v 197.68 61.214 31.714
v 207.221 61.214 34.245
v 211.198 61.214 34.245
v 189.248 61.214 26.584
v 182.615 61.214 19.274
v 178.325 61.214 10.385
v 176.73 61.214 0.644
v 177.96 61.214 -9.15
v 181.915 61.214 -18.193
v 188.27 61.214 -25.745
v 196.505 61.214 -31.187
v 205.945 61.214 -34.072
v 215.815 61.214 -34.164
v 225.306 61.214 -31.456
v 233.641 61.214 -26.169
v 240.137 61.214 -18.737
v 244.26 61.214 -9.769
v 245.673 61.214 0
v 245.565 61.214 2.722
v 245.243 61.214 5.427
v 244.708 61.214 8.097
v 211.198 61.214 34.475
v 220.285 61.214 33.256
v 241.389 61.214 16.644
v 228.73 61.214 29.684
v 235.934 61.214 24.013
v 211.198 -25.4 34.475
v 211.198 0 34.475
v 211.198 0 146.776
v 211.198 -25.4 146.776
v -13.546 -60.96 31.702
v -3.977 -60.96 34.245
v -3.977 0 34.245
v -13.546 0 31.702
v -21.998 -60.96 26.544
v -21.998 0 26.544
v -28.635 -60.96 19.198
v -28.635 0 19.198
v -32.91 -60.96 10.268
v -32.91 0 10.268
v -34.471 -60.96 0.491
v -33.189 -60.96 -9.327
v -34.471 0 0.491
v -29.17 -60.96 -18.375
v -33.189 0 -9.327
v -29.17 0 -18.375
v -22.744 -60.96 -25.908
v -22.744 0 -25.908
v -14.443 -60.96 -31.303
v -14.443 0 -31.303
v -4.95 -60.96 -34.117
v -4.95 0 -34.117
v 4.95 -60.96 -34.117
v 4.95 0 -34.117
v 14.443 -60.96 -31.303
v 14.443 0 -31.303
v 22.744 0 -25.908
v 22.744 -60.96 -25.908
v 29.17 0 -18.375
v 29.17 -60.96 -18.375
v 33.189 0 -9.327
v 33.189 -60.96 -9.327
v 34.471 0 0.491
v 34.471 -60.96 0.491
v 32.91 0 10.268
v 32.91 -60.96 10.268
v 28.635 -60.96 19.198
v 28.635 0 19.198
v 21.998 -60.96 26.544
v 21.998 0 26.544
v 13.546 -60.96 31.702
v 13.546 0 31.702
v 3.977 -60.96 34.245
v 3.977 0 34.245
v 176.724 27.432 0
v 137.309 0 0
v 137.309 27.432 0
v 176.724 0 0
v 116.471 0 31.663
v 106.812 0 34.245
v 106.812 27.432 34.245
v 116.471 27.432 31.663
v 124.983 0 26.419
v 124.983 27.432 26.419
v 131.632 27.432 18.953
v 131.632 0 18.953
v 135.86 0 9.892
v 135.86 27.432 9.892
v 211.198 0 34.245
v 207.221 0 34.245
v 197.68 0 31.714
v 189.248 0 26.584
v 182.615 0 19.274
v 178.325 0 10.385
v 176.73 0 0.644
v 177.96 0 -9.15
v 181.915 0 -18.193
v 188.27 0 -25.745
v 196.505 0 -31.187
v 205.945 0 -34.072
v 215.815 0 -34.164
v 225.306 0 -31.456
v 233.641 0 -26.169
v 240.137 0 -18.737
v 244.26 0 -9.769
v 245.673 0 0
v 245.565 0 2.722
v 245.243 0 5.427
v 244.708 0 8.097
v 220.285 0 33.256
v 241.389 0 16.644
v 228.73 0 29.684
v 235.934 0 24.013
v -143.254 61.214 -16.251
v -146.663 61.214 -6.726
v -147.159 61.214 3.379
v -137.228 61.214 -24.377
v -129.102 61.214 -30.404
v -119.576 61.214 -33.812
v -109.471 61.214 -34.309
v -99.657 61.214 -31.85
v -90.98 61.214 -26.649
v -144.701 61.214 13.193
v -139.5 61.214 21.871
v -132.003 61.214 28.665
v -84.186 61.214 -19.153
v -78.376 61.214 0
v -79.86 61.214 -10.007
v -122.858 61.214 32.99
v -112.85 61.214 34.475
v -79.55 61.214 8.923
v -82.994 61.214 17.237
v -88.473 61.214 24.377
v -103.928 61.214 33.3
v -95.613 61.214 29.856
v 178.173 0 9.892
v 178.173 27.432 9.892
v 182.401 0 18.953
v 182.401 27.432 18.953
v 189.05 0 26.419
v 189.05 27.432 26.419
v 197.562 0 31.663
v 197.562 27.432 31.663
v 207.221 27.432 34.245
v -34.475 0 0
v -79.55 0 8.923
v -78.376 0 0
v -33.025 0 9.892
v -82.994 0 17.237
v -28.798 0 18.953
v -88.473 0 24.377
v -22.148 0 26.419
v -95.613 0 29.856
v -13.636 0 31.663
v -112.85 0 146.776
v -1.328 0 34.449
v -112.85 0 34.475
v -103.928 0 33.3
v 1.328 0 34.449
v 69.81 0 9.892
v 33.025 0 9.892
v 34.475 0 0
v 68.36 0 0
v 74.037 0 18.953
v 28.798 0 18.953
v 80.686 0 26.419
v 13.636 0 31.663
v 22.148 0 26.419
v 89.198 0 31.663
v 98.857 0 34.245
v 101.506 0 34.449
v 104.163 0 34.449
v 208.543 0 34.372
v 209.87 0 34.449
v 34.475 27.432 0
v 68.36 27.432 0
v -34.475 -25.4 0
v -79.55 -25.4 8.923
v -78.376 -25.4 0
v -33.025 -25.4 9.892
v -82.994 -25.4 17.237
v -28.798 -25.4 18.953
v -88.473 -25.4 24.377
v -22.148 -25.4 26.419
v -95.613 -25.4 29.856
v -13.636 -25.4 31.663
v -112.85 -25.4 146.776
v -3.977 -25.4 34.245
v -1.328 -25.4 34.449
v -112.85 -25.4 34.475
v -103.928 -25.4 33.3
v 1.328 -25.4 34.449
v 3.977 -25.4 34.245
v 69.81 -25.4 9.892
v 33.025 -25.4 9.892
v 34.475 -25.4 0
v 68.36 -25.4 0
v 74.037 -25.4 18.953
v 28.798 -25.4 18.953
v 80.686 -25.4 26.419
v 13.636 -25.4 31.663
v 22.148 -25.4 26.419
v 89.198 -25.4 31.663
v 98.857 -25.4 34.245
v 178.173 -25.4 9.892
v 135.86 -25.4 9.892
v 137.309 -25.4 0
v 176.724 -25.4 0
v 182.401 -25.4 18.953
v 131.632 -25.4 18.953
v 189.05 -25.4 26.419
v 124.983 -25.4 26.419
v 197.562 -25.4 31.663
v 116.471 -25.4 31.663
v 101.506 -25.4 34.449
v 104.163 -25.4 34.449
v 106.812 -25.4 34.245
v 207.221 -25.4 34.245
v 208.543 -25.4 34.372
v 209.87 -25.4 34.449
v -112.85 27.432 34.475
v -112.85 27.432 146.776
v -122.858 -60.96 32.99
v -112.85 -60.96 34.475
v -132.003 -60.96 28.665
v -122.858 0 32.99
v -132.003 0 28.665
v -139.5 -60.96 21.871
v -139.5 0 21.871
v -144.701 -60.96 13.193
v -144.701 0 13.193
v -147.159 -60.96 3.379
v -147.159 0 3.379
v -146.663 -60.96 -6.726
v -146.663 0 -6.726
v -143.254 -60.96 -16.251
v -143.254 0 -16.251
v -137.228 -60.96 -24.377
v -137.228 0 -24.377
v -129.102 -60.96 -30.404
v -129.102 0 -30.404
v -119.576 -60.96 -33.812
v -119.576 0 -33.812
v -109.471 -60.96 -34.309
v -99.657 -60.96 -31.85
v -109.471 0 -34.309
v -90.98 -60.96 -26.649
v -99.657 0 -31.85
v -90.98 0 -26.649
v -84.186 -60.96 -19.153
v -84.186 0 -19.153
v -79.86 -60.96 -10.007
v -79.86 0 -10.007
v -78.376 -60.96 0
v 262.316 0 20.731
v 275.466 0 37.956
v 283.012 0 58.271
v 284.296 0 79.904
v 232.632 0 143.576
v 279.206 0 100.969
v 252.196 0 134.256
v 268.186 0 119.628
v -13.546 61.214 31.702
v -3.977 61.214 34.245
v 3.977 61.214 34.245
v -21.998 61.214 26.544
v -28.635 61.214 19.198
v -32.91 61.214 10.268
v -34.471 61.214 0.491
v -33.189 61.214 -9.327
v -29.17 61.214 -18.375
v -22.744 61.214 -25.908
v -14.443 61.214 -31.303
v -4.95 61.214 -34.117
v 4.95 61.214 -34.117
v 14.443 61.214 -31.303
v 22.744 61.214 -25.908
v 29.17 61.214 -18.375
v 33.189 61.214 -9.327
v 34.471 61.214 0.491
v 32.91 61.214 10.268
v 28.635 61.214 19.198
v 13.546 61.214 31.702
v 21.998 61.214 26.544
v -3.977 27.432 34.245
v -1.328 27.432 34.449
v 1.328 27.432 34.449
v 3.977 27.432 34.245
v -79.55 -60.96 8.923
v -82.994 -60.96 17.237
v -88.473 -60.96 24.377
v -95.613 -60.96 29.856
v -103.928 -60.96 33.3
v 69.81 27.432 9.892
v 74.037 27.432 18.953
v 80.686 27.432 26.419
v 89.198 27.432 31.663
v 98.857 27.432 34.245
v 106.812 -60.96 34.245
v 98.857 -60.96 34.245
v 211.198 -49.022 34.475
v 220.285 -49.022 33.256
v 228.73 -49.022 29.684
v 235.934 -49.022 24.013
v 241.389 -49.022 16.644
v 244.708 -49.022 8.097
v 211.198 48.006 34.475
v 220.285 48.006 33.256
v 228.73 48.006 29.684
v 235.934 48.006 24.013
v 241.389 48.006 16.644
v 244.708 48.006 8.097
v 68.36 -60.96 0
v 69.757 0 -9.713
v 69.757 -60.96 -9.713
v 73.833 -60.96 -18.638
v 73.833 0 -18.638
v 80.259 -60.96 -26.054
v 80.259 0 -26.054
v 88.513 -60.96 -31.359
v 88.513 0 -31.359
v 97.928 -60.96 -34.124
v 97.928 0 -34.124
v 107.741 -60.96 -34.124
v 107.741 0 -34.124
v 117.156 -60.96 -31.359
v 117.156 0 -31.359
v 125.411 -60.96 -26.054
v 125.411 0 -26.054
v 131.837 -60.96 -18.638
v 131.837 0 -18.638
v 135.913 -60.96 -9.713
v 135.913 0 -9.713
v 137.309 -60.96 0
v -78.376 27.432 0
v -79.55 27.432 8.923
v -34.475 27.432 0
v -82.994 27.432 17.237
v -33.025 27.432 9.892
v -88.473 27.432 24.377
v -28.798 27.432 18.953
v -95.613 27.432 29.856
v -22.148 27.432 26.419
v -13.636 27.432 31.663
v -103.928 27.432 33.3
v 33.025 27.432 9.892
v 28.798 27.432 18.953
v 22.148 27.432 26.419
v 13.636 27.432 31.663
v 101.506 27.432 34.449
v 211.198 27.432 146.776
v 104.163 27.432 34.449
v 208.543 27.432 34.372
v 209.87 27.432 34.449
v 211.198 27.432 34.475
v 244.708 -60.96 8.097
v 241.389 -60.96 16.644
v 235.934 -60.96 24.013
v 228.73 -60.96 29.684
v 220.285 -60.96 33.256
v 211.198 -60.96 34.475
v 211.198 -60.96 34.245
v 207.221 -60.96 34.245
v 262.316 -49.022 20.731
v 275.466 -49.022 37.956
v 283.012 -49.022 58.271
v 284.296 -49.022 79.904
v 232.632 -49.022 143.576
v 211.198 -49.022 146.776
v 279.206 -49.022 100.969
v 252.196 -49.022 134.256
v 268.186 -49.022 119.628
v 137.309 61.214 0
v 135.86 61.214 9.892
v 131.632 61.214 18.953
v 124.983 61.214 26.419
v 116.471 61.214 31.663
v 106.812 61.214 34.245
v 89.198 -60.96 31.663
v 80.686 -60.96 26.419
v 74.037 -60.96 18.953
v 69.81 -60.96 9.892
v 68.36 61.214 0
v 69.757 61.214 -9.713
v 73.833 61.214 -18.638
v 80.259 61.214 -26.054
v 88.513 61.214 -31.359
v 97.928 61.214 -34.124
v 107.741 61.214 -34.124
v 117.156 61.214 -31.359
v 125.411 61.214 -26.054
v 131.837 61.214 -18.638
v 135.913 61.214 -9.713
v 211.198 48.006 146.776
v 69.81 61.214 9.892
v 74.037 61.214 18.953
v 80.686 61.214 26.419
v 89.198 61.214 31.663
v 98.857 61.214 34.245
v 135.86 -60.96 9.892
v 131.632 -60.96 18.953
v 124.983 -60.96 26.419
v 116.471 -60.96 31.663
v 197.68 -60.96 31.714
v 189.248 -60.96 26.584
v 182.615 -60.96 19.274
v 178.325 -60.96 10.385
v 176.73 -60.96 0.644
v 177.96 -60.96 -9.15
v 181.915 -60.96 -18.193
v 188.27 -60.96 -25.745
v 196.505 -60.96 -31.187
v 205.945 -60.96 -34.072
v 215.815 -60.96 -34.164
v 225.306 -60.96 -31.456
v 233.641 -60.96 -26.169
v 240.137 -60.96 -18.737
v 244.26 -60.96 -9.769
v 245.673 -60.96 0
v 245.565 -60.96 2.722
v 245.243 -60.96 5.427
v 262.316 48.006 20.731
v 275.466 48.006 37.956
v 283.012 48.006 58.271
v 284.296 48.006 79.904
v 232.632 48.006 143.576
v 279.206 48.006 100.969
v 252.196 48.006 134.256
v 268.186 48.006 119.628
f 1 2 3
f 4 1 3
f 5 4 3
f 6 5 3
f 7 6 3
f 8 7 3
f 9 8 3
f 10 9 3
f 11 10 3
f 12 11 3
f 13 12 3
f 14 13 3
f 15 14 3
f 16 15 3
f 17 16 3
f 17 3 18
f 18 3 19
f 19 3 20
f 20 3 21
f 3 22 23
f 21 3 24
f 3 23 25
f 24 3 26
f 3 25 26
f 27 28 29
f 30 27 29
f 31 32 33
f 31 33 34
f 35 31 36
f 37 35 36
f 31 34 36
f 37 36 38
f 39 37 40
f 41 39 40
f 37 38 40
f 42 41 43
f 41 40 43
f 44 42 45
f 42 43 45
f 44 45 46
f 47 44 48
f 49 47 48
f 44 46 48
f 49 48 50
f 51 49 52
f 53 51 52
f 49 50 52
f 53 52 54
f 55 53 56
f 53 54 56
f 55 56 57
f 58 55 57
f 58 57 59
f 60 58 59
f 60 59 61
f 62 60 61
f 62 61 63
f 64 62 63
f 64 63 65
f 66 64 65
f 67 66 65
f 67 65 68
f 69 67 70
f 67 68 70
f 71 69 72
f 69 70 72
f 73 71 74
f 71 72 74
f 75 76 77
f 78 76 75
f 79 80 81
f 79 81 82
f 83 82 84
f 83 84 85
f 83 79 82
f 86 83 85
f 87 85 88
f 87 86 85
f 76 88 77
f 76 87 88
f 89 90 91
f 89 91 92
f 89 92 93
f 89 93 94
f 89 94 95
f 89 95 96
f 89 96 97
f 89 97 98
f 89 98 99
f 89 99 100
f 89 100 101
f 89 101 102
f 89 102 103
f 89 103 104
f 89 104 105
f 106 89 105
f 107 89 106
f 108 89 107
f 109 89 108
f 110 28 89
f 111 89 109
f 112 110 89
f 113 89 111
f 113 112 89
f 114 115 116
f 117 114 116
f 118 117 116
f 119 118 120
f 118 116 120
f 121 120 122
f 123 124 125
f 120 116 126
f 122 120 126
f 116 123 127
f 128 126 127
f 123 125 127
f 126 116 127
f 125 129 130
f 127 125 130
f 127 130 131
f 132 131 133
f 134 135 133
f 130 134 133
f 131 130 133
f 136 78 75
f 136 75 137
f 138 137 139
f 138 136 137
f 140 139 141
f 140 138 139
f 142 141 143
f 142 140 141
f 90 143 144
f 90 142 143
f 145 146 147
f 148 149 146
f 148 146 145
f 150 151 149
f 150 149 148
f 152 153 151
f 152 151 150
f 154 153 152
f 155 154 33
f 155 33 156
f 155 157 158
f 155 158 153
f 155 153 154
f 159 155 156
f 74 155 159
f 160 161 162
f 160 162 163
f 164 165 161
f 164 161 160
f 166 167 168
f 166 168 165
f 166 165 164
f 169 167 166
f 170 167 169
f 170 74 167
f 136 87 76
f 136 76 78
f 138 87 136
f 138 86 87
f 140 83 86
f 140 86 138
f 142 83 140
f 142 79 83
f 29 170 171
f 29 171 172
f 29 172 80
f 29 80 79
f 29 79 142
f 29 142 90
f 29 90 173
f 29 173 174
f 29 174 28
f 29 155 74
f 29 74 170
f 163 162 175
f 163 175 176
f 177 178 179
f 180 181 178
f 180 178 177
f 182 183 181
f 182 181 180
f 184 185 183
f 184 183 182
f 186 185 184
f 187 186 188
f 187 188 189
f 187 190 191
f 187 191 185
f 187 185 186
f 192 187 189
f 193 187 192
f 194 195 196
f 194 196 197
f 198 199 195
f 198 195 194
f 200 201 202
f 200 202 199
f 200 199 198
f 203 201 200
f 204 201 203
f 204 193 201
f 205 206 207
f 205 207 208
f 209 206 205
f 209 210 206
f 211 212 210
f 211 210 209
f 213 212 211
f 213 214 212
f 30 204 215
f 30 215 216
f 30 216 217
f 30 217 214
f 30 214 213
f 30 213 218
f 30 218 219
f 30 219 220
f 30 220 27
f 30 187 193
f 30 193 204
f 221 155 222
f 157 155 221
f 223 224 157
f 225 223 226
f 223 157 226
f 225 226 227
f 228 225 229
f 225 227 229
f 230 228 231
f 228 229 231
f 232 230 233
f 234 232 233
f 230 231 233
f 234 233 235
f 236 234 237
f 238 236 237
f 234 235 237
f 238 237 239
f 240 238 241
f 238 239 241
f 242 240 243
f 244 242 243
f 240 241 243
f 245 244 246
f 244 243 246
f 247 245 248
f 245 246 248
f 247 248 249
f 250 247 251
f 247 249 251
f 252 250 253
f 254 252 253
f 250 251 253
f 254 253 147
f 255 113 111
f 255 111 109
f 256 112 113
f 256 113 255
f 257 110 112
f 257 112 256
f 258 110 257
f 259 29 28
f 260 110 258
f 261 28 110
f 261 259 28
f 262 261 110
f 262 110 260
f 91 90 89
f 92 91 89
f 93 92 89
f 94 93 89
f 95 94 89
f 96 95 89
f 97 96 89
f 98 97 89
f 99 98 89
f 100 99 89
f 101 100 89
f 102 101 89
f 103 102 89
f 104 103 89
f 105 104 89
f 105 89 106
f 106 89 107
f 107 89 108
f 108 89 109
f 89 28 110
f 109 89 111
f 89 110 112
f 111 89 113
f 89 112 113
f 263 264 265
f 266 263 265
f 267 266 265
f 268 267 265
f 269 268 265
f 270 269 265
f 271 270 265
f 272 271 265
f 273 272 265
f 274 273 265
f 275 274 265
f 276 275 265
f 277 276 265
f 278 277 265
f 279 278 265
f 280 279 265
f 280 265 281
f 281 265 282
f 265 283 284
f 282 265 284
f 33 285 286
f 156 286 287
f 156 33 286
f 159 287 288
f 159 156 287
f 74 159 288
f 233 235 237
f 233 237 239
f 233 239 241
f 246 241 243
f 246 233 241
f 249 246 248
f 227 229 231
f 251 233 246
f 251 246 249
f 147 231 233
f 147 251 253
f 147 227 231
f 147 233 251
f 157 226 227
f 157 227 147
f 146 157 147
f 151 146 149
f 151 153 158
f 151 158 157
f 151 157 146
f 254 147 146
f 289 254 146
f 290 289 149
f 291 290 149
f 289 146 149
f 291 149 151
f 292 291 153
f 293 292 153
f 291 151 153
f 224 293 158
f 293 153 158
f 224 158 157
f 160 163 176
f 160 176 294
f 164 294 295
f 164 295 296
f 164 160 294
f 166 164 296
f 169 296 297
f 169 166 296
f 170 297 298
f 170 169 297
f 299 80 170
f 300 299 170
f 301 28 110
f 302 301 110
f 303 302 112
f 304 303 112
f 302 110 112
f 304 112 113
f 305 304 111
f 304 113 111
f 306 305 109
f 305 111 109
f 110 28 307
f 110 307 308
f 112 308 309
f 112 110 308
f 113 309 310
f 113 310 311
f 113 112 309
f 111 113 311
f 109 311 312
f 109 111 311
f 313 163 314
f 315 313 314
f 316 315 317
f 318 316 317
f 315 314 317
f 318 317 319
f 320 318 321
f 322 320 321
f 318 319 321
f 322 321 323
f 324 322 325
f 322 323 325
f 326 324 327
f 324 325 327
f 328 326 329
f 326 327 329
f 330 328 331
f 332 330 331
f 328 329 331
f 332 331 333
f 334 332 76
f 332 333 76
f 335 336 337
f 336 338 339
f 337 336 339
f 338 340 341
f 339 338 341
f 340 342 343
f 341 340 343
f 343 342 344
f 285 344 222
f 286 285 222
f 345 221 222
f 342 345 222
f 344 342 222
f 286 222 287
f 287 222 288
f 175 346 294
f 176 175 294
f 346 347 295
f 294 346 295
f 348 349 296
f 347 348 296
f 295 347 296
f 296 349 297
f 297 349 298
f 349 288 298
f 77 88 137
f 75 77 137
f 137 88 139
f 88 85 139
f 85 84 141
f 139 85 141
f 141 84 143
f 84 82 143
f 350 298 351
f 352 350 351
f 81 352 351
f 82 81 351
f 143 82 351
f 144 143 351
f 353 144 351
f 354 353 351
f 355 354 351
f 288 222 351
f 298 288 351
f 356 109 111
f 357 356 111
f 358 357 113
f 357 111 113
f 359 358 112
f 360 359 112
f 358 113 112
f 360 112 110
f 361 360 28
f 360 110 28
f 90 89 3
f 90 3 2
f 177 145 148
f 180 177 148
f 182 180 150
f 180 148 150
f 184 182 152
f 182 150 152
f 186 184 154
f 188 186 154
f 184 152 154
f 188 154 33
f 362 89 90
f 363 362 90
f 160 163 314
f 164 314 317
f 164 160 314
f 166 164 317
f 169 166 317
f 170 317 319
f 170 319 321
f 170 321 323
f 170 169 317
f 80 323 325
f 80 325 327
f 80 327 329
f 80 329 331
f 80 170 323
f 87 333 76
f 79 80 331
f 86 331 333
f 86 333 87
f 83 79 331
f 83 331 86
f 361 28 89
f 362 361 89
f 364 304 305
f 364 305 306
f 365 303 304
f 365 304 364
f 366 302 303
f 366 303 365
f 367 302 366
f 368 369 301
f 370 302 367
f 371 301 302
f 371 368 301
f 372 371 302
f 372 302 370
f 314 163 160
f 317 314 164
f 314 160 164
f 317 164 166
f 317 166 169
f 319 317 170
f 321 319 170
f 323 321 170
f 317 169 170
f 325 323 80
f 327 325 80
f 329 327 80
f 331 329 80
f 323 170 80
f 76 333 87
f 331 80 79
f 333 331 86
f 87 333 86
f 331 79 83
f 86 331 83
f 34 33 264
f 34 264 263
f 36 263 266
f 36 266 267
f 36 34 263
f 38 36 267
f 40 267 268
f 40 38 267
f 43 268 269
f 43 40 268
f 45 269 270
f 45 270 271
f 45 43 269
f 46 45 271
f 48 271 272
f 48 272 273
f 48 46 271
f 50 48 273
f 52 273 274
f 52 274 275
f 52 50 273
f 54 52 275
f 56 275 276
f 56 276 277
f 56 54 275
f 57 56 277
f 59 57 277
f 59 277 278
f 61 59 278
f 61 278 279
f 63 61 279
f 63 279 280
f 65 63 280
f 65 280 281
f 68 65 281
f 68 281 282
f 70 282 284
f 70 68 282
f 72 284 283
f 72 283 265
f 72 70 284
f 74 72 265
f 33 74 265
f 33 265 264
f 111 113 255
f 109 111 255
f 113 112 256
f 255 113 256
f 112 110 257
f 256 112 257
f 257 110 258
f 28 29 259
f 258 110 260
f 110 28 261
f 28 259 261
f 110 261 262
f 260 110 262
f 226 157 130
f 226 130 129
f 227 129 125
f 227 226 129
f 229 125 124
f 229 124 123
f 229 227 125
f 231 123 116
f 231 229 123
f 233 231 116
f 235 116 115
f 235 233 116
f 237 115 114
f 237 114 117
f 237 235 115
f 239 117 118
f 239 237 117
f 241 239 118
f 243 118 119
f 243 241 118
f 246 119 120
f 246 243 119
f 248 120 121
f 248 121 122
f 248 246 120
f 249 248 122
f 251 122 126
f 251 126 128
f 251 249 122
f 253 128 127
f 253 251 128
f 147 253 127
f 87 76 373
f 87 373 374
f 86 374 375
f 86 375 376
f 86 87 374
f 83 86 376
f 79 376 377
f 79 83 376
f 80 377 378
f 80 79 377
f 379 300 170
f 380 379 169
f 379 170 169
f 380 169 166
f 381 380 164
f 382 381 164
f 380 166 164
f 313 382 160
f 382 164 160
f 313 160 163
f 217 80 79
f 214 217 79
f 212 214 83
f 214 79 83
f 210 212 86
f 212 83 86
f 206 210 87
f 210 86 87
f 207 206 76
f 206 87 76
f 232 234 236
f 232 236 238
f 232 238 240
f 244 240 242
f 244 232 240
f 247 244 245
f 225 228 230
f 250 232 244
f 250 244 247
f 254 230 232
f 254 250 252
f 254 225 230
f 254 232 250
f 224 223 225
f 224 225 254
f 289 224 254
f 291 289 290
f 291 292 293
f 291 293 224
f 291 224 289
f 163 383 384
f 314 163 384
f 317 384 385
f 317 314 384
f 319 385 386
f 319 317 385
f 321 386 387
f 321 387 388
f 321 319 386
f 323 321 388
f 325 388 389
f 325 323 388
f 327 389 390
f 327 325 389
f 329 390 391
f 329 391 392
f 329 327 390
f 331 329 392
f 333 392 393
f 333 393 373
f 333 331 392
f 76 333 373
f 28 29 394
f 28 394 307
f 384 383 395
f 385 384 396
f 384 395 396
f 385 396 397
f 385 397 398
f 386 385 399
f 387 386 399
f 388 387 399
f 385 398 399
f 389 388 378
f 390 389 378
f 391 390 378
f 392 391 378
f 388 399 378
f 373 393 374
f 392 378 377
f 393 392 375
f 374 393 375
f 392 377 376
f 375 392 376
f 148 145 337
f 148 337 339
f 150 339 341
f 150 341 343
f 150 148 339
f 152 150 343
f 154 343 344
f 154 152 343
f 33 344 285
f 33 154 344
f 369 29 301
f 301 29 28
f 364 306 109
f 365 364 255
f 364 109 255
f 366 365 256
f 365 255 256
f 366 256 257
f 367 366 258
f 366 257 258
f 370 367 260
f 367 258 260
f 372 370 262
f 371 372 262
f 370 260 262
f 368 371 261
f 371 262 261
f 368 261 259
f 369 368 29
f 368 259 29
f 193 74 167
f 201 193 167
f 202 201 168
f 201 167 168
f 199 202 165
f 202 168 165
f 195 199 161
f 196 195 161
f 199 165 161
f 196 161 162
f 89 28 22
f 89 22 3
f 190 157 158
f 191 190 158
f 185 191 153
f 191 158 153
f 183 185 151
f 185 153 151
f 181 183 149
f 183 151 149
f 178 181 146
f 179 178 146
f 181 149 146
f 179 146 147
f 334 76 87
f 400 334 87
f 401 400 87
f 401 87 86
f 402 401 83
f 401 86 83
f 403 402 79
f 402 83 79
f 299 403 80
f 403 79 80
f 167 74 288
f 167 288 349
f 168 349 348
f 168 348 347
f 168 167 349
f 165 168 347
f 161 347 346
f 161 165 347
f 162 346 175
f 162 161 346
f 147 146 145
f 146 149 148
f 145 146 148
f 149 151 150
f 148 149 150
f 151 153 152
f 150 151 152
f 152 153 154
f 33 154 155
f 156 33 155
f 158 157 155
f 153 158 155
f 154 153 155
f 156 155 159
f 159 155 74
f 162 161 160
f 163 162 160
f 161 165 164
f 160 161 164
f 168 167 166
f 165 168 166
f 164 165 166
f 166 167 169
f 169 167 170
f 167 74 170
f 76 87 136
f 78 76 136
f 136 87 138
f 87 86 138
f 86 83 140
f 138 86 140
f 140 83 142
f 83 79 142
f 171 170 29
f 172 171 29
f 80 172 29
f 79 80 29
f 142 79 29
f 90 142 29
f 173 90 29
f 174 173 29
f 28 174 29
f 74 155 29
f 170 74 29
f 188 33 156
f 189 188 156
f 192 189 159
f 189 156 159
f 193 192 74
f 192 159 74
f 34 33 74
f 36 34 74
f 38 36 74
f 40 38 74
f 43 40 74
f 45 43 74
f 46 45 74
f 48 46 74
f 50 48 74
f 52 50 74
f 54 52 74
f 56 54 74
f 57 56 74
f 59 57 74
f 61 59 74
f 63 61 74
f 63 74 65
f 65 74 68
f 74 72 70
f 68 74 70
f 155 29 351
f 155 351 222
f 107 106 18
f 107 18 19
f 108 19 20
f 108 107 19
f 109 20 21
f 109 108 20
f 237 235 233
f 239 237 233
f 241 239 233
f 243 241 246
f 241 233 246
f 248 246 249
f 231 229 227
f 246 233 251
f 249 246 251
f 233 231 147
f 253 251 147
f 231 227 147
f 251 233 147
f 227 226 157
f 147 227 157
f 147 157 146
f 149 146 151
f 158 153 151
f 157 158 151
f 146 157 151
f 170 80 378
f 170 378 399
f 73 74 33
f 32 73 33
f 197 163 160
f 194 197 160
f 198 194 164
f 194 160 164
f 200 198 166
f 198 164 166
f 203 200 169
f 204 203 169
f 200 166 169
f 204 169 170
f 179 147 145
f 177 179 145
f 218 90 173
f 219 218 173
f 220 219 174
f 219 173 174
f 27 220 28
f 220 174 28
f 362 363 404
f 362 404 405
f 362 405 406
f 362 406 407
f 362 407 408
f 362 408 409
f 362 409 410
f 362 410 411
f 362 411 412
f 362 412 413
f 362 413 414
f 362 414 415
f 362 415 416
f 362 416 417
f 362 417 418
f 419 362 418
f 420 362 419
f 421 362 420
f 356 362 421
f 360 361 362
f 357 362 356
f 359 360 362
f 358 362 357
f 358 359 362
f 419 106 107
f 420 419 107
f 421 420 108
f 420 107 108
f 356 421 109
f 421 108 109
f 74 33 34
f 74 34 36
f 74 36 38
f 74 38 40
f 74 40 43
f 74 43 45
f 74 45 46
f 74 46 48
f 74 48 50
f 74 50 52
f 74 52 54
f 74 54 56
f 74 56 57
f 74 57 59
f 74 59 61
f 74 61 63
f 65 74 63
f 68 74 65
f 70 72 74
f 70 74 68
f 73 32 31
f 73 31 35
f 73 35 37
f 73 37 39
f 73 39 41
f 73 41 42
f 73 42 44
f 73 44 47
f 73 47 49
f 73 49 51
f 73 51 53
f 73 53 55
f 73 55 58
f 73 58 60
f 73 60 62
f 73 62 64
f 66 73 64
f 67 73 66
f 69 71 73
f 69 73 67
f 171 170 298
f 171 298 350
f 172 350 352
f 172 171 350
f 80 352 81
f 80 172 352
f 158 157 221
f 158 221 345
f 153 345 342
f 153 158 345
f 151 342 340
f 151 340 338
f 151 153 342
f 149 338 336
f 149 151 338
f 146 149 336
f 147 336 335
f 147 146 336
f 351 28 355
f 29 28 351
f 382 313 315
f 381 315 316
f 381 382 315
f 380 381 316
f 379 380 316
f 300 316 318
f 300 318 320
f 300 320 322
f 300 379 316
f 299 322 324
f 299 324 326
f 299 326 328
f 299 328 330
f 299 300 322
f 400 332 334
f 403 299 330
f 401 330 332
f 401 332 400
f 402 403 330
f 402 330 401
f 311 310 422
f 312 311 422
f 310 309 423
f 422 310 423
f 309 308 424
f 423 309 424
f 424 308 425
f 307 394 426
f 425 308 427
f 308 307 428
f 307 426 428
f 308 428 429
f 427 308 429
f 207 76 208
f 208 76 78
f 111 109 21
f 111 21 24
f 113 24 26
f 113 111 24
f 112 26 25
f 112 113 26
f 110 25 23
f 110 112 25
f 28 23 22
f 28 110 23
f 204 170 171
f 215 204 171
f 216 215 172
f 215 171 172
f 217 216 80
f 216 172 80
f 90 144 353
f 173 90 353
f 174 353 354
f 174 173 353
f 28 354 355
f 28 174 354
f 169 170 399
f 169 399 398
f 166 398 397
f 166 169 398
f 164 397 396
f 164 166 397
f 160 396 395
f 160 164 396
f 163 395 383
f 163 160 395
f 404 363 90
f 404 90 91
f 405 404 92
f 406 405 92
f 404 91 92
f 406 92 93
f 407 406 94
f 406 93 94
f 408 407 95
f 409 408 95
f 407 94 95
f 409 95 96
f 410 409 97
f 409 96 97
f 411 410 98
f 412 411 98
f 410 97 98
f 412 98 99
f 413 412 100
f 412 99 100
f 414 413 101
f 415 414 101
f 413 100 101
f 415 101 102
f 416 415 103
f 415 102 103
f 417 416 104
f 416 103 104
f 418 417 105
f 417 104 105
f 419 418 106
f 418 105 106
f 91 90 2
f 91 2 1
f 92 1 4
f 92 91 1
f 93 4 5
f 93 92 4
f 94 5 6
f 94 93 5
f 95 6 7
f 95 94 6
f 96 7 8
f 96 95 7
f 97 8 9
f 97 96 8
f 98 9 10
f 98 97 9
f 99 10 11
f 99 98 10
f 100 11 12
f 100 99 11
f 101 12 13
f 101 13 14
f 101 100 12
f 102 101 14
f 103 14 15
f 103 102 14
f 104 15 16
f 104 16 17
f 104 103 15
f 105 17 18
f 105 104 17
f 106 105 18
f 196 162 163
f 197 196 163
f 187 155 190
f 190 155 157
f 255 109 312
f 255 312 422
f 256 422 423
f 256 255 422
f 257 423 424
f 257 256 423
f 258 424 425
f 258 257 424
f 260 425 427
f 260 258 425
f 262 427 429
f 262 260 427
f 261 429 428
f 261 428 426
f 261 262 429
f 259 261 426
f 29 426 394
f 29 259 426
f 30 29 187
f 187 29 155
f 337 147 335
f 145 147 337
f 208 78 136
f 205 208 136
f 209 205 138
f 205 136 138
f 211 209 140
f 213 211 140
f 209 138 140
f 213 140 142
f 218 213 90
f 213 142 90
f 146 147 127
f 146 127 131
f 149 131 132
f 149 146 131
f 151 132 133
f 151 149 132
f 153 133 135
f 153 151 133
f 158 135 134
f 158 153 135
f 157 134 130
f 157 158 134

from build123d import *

# Parameters (mm, degrees)
F1_DEPTH = 60.96
F2_DEPTH = 61.214
F0_W     = 287.0590090752
F0_H     = 33.863581717
F3_DEPTH = 25.4
F4_DEPTH = 27.432
F5_DEPTH = 49.022
F6_DEPTH = 48.006


with BuildPart() as f1:
    # F0 (on Front) → F1 (new body)
    with BuildSketch(Plane.XZ):
        with BuildLine():
            ThreePointArc((-112.8502339125, 34.4747126152), (-137.2275369821, -24.3773030697), (-78.3755212973, 0))
            Line((-78.3755212973, 0), (-112.8502339125, 0))
            Line((-112.8502339125, 0), (-112.8502339125, 34.4747126152))
        make_face()
        with BuildLine():
            Line((-112.8502339125, 0), (-78.3755212973, 0))
            ThreePointArc((-78.3755212973, 0), (-88.4729308428, 24.3773030697), (-112.8502339125, 34.4747126152))
            Line((-112.8502339125, 34.4747126152), (-112.8502339125, 0))
        make_face()
    extrude(amount=F1_DEPTH)


with BuildPart() as f1b:
    # F0 (on Front) → F1, piece 2 (new body)
    with BuildSketch(Plane.XZ):
        with BuildLine():
            Line((34.4747126152, 0), (-34.4747126152, 0))
            ThreePointArc((-34.4747126152, 0), (0, -34.4747126152), (34.4747126152, 0))
        make_face()
        with BuildLine():
            ThreePointArc((-3.9774071478, 34.2445038259), (-25.7451527309, 22.9279942595), (-34.4747126152, 0))
            Line((-34.4747126152, 0), (34.4747126152, 0))
            ThreePointArc((34.4747126152, 0), (25.7451527309, 22.9279942595), (3.9774071478, 34.2445038259))
            Line((3.9774071478, 34.2445038259), (-3.9774071478, 34.2445038259))
        make_face()
    extrude(amount=F1_DEPTH)


with BuildPart() as f1c:
    # F0 (on Front) → F1, piece 3 (new body)
    with BuildSketch(Plane.XZ):
        with BuildLine():
            Line((137.3094663074, 0), (68.3600410769, 0))
            ThreePointArc((68.3600410769, 0), (102.8347536922, -34.4747126152), (137.3094663074, 0))
        make_face()
        with BuildLine():
            ThreePointArc((98.8573465443, 34.2445038259), (77.0896009612, 22.9279942595), (68.3600410769, 0))
            Line((68.3600410769, 0), (137.3094663074, 0))
            ThreePointArc((137.3094663074, 0), (128.5799064231, 22.9279942595), (106.81216084, 34.2445038259))
            Line((106.81216084, 34.2445038259), (98.8573465443, 34.2445038259))
        make_face()
    extrude(amount=F1_DEPTH)


with BuildPart() as f1d:
    # F0 (on Front) → F1, piece 4 (new body)
    with BuildSketch(Plane.XZ):
        with BuildLine():
            Line((211.1982256174, 0), (176.7235130022, 0))
            ThreePointArc((176.7235130022, 0), (211.1982256174, -34.4747126152), (245.6729382326, 0))
            ThreePointArc((245.6729382326, 0), (245.4309760234, 4.0773287267), (244.7084858393, 8.0974236497))
            ThreePointArc((244.7084858393, 8.0974236497), (228.435581925, 2.0530739485), (211.1982256174, 0))
        make_face()
        with BuildLine():
            ThreePointArc((207.2208184696, 34.2445038259), (185.4530728865, 22.9279942595), (176.7235130022, 0))
            Line((176.7235130022, 0), (211.1982256174, 0))
            Line((211.1982256174, 0), (211.1982256174, 34.2445038259))
            Line((211.1982256174, 34.2445038259), (207.2208184696, 34.2445038259))
        make_face()
        with BuildLine():
            ThreePointArc((244.7084858393, 8.0974236497), (232.5213287764, 27.0893167425), (211.1982256174, 34.4747126152))
            Line((211.1982256174, 34.4747126152), (211.1982256174, 34.2445038259))
            Line((211.1982256174, 34.2445038259), (211.1982256174, 0))
            ThreePointArc((211.1982256174, 0), (228.435581925, 2.0530739485), (244.7084858393, 8.0974236497))
        make_face()
    extrude(amount=F1_DEPTH)


with BuildPart() as f2:
    # F0 (on Front) → F2 (new body)
    with BuildSketch(Plane.XZ):
        with BuildLine():
            ThreePointArc((-112.8502339125, 34.4747126152), (-137.2275369821, -24.3773030697), (-78.3755212973, 0))
            Line((-78.3755212973, 0), (-112.8502339125, 0))
            Line((-112.8502339125, 0), (-112.8502339125, 34.4747126152))
        make_face()
        with BuildLine():
            Line((-112.8502339125, 0), (-78.3755212973, 0))
            ThreePointArc((-78.3755212973, 0), (-88.4729308428, 24.3773030697), (-112.8502339125, 34.4747126152))
            Line((-112.8502339125, 34.4747126152), (-112.8502339125, 0))
        make_face()
    extrude(amount=-F2_DEPTH)


with BuildPart() as f2b:
    # F0 (on Front) → F2, piece 2 (new body)
    with BuildSketch(Plane.XZ):
        with BuildLine():
            Line((34.4747126152, 0), (-34.4747126152, 0))
            ThreePointArc((-34.4747126152, 0), (0, -34.4747126152), (34.4747126152, 0))
        make_face()
        with BuildLine():
            ThreePointArc((-3.9774071478, 34.2445038259), (-25.7451527309, 22.9279942595), (-34.4747126152, 0))
            Line((-34.4747126152, 0), (34.4747126152, 0))
            ThreePointArc((34.4747126152, 0), (25.7451527309, 22.9279942595), (3.9774071478, 34.2445038259))
            Line((3.9774071478, 34.2445038259), (-3.9774071478, 34.2445038259))
        make_face()
    extrude(amount=-F2_DEPTH)


with BuildPart() as f2c:
    # F0 (on Front) → F2, piece 3 (new body)
    with BuildSketch(Plane.XZ):
        with BuildLine():
            ThreePointArc((98.8573465443, 34.2445038259), (77.0896009612, 22.9279942595), (68.3600410769, 0))
            Line((68.3600410769, 0), (137.3094663074, 0))
            ThreePointArc((137.3094663074, 0), (128.5799064231, 22.9279942595), (106.81216084, 34.2445038259))
            Line((106.81216084, 34.2445038259), (98.8573465443, 34.2445038259))
        make_face()
        with BuildLine():
            Line((137.3094663074, 0), (68.3600410769, 0))
            ThreePointArc((68.3600410769, 0), (102.8347536922, -34.4747126152), (137.3094663074, 0))
        make_face()
    extrude(amount=-F2_DEPTH)


with BuildPart() as f2d:
    # F0 (on Front) → F2, piece 4 (new body)
    with BuildSketch(Plane.XZ):
        with BuildLine():
            ThreePointArc((207.2208184696, 34.2445038259), (185.4530728865, 22.9279942595), (176.7235130022, 0))
            Line((176.7235130022, 0), (211.1982256174, 0))
            Line((211.1982256174, 0), (211.1982256174, 34.2445038259))
            Line((211.1982256174, 34.2445038259), (207.2208184696, 34.2445038259))
        make_face()
        with BuildLine():
            ThreePointArc((244.7084858393, 8.0974236497), (232.5213287764, 27.0893167425), (211.1982256174, 34.4747126152))
            Line((211.1982256174, 34.4747126152), (211.1982256174, 34.2445038259))
            Line((211.1982256174, 34.2445038259), (211.1982256174, 0))
            ThreePointArc((211.1982256174, 0), (228.435581925, 2.0530739485), (244.7084858393, 8.0974236497))
        make_face()
        with BuildLine():
            Line((211.1982256174, 0), (176.7235130022, 0))
            ThreePointArc((176.7235130022, 0), (211.1982256174, -34.4747126152), (245.6729382326, 0))
            ThreePointArc((245.6729382326, 0), (245.4309760234, 4.0773287267), (244.7084858393, 8.0974236497))
            ThreePointArc((244.7084858393, 8.0974236497), (228.435581925, 2.0530739485), (211.1982256174, 0))
        make_face()
    extrude(amount=-F2_DEPTH)


with BuildPart() as f3:
    # F0 (on Front) → F3 (new body)
    with BuildSketch(Plane.XZ):
        with BuildLine():
            Line((-78.3755212973, 0), (-75.8607834578, 0))
            Line((-75.8607834578, 0), (-75.8607834578, 34.2445038259))
            Line((-75.8607834578, 34.2445038259), (-75.8607834578, 112.9122152925))
            Line((-75.8607834578, 112.9122152925), (-75.8607834578, 146.7757970095))
            Line((-75.8607834578, 146.7757970095), (-112.8502339125, 146.7757970095))
            Line((-112.8502339125, 146.7757970095), (-112.8502339125, 34.4747126152))
            ThreePointArc((-112.8502339125, 34.4747126152), (-88.4729308428, 24.3773030697), (-78.3755212973, 0))
        make_face()
        with BuildLine():
            Line((-75.8607834578, 34.2445038259), (-75.8607834578, 0))
            Line((-75.8607834578, 0), (-34.4747126152, 0))
            ThreePointArc((-34.4747126152, 0), (-25.7451527309, 22.9279942595), (-3.9774071478, 34.2445038259))
            Line((-3.9774071478, 34.2445038259), (-75.8607834578, 34.2445038259))
        make_face()
        with BuildLine():
            ThreePointArc((3.9774071478, 34.2445038259), (25.7451527309, 22.9279942595), (34.4747126152, 0))
            Line((34.4747126152, 0), (68.3600410769, 0))
            ThreePointArc((68.3600410769, 0), (77.0896009612, 22.9279942595), (98.8573465443, 34.2445038259))
            Line((98.8573465443, 34.2445038259), (3.9774071478, 34.2445038259))
        make_face()
        with BuildLine():
            ThreePointArc((106.81216084, 34.2445038259), (128.5799064231, 22.9279942595), (137.3094663074, 0))
            Line((137.3094663074, 0), (176.7235130022, 0))
            ThreePointArc((176.7235130022, 0), (185.4530728865, 22.9279942595), (207.2208184696, 34.2445038259))
            Line((207.2208184696, 34.2445038259), (106.81216084, 34.2445038259))
        make_face()
        with Locations((67.6687210798, 129.844006151)):
            Rectangle(F0_W, F0_H)
        with BuildLine():
            Line((-75.8607834578, 112.9122152925), (-75.8607834578, 34.2445038259))
            Line((-75.8607834578, 34.2445038259), (-3.9774071478, 34.2445038259))
            ThreePointArc((-3.9774071478, 34.2445038259), (0, 34.4747126152), (3.9774071478, 34.2445038259))
            Line((3.9774071478, 34.2445038259), (98.8573465443, 34.2445038259))
            ThreePointArc((98.8573465443, 34.2445038259), (102.8347536922, 34.4747126152), (106.81216084, 34.2445038259))
            Line((106.81216084, 34.2445038259), (207.2208184696, 34.2445038259))
            ThreePointArc((207.2208184696, 34.2445038259), (209.2061937586, 34.4171122986), (211.1982256174, 34.4747126152))
            Line((211.1982256174, 34.4747126152), (211.1982256174, 112.9122152925))
            Line((211.1982256174, 112.9122152925), (-75.8607834578, 112.9122152925))
        make_face()
    extrude(amount=F3_DEPTH)


with BuildPart() as f4:
    # F0 (on Front) → F4 (new body)
    with BuildSketch(Plane.XZ):
        with BuildLine():
            Line((-78.3755212973, 0), (-75.8607834578, 0))
            Line((-75.8607834578, 0), (-75.8607834578, 34.2445038259))
            Line((-75.8607834578, 34.2445038259), (-75.8607834578, 112.9122152925))
            Line((-75.8607834578, 112.9122152925), (-75.8607834578, 146.7757970095))
            Line((-75.8607834578, 146.7757970095), (-112.8502339125, 146.7757970095))
            Line((-112.8502339125, 146.7757970095), (-112.8502339125, 34.4747126152))
            ThreePointArc((-112.8502339125, 34.4747126152), (-88.4729308428, 24.3773030697), (-78.3755212973, 0))
        make_face()
        with BuildLine():
            Line((-75.8607834578, 34.2445038259), (-75.8607834578, 0))
            Line((-75.8607834578, 0), (-34.4747126152, 0))
            ThreePointArc((-34.4747126152, 0), (-25.7451527309, 22.9279942595), (-3.9774071478, 34.2445038259))
            Line((-3.9774071478, 34.2445038259), (-75.8607834578, 34.2445038259))
        make_face()
        with BuildLine():
            ThreePointArc((3.9774071478, 34.2445038259), (25.7451527309, 22.9279942595), (34.4747126152, 0))
            Line((34.4747126152, 0), (68.3600410769, 0))
            ThreePointArc((68.3600410769, 0), (77.0896009612, 22.9279942595), (98.8573465443, 34.2445038259))
            Line((98.8573465443, 34.2445038259), (3.9774071478, 34.2445038259))
        make_face()
        with BuildLine():
            ThreePointArc((106.81216084, 34.2445038259), (128.5799064231, 22.9279942595), (137.3094663074, 0))
            Line((137.3094663074, 0), (176.7235130022, 0))
            ThreePointArc((176.7235130022, 0), (185.4530728865, 22.9279942595), (207.2208184696, 34.2445038259))
            Line((207.2208184696, 34.2445038259), (106.81216084, 34.2445038259))
        make_face()
        with BuildLine():
            Line((-75.8607834578, 112.9122152925), (-75.8607834578, 34.2445038259))
            Line((-75.8607834578, 34.2445038259), (-3.9774071478, 34.2445038259))
            ThreePointArc((-3.9774071478, 34.2445038259), (0, 34.4747126152), (3.9774071478, 34.2445038259))
            Line((3.9774071478, 34.2445038259), (98.8573465443, 34.2445038259))
            ThreePointArc((98.8573465443, 34.2445038259), (102.8347536922, 34.4747126152), (106.81216084, 34.2445038259))
            Line((106.81216084, 34.2445038259), (207.2208184696, 34.2445038259))
            ThreePointArc((207.2208184696, 34.2445038259), (209.2061937586, 34.4171122986), (211.1982256174, 34.4747126152))
            Line((211.1982256174, 34.4747126152), (211.1982256174, 112.9122152925))
            Line((211.1982256174, 112.9122152925), (-75.8607834578, 112.9122152925))
        make_face()
        with Locations((67.6687210798, 129.844006151)):
            Rectangle(F0_W, F0_H)
    extrude(amount=-F4_DEPTH)


with BuildPart() as f5:
    # F0 (on Front) → F5 (new body)
    with BuildSketch(Plane.XZ):
        with BuildLine():
            Line((211.1982256174, 146.7757970095), (211.1982256174, 112.9122152925))
            Line((211.1982256174, 112.9122152925), (211.1982256174, 34.4747126152))
            ThreePointArc((211.1982256174, 34.4747126152), (232.5213287764, 27.0893167425), (244.7084858393, 8.0974236497))
            ThreePointArc((244.7084858393, 8.0974236497), (282.5330501736, 90.6252548123), (211.1982256174, 146.7757970095))
        make_face()
    extrude(amount=F5_DEPTH)


with BuildPart() as f6:
    # F0 (on Front) → F6 (new body)
    with BuildSketch(Plane.XZ):
        with BuildLine():
            Line((211.1982256174, 146.7757970095), (211.1982256174, 112.9122152925))
            Line((211.1982256174, 112.9122152925), (211.1982256174, 34.4747126152))
            ThreePointArc((211.1982256174, 34.4747126152), (232.5213287764, 27.0893167425), (244.7084858393, 8.0974236497))
            ThreePointArc((244.7084858393, 8.0974236497), (282.5330501736, 90.6252548123), (211.1982256174, 146.7757970095))
        make_face()
    extrude(amount=-F6_DEPTH)


solid = Compound([f1.part, f1b.part, f1c.part, f1d.part, f2.part, f2b.part, f2c.part, f2d.part, f3.part, f4.part, f5.part, f6.part])
